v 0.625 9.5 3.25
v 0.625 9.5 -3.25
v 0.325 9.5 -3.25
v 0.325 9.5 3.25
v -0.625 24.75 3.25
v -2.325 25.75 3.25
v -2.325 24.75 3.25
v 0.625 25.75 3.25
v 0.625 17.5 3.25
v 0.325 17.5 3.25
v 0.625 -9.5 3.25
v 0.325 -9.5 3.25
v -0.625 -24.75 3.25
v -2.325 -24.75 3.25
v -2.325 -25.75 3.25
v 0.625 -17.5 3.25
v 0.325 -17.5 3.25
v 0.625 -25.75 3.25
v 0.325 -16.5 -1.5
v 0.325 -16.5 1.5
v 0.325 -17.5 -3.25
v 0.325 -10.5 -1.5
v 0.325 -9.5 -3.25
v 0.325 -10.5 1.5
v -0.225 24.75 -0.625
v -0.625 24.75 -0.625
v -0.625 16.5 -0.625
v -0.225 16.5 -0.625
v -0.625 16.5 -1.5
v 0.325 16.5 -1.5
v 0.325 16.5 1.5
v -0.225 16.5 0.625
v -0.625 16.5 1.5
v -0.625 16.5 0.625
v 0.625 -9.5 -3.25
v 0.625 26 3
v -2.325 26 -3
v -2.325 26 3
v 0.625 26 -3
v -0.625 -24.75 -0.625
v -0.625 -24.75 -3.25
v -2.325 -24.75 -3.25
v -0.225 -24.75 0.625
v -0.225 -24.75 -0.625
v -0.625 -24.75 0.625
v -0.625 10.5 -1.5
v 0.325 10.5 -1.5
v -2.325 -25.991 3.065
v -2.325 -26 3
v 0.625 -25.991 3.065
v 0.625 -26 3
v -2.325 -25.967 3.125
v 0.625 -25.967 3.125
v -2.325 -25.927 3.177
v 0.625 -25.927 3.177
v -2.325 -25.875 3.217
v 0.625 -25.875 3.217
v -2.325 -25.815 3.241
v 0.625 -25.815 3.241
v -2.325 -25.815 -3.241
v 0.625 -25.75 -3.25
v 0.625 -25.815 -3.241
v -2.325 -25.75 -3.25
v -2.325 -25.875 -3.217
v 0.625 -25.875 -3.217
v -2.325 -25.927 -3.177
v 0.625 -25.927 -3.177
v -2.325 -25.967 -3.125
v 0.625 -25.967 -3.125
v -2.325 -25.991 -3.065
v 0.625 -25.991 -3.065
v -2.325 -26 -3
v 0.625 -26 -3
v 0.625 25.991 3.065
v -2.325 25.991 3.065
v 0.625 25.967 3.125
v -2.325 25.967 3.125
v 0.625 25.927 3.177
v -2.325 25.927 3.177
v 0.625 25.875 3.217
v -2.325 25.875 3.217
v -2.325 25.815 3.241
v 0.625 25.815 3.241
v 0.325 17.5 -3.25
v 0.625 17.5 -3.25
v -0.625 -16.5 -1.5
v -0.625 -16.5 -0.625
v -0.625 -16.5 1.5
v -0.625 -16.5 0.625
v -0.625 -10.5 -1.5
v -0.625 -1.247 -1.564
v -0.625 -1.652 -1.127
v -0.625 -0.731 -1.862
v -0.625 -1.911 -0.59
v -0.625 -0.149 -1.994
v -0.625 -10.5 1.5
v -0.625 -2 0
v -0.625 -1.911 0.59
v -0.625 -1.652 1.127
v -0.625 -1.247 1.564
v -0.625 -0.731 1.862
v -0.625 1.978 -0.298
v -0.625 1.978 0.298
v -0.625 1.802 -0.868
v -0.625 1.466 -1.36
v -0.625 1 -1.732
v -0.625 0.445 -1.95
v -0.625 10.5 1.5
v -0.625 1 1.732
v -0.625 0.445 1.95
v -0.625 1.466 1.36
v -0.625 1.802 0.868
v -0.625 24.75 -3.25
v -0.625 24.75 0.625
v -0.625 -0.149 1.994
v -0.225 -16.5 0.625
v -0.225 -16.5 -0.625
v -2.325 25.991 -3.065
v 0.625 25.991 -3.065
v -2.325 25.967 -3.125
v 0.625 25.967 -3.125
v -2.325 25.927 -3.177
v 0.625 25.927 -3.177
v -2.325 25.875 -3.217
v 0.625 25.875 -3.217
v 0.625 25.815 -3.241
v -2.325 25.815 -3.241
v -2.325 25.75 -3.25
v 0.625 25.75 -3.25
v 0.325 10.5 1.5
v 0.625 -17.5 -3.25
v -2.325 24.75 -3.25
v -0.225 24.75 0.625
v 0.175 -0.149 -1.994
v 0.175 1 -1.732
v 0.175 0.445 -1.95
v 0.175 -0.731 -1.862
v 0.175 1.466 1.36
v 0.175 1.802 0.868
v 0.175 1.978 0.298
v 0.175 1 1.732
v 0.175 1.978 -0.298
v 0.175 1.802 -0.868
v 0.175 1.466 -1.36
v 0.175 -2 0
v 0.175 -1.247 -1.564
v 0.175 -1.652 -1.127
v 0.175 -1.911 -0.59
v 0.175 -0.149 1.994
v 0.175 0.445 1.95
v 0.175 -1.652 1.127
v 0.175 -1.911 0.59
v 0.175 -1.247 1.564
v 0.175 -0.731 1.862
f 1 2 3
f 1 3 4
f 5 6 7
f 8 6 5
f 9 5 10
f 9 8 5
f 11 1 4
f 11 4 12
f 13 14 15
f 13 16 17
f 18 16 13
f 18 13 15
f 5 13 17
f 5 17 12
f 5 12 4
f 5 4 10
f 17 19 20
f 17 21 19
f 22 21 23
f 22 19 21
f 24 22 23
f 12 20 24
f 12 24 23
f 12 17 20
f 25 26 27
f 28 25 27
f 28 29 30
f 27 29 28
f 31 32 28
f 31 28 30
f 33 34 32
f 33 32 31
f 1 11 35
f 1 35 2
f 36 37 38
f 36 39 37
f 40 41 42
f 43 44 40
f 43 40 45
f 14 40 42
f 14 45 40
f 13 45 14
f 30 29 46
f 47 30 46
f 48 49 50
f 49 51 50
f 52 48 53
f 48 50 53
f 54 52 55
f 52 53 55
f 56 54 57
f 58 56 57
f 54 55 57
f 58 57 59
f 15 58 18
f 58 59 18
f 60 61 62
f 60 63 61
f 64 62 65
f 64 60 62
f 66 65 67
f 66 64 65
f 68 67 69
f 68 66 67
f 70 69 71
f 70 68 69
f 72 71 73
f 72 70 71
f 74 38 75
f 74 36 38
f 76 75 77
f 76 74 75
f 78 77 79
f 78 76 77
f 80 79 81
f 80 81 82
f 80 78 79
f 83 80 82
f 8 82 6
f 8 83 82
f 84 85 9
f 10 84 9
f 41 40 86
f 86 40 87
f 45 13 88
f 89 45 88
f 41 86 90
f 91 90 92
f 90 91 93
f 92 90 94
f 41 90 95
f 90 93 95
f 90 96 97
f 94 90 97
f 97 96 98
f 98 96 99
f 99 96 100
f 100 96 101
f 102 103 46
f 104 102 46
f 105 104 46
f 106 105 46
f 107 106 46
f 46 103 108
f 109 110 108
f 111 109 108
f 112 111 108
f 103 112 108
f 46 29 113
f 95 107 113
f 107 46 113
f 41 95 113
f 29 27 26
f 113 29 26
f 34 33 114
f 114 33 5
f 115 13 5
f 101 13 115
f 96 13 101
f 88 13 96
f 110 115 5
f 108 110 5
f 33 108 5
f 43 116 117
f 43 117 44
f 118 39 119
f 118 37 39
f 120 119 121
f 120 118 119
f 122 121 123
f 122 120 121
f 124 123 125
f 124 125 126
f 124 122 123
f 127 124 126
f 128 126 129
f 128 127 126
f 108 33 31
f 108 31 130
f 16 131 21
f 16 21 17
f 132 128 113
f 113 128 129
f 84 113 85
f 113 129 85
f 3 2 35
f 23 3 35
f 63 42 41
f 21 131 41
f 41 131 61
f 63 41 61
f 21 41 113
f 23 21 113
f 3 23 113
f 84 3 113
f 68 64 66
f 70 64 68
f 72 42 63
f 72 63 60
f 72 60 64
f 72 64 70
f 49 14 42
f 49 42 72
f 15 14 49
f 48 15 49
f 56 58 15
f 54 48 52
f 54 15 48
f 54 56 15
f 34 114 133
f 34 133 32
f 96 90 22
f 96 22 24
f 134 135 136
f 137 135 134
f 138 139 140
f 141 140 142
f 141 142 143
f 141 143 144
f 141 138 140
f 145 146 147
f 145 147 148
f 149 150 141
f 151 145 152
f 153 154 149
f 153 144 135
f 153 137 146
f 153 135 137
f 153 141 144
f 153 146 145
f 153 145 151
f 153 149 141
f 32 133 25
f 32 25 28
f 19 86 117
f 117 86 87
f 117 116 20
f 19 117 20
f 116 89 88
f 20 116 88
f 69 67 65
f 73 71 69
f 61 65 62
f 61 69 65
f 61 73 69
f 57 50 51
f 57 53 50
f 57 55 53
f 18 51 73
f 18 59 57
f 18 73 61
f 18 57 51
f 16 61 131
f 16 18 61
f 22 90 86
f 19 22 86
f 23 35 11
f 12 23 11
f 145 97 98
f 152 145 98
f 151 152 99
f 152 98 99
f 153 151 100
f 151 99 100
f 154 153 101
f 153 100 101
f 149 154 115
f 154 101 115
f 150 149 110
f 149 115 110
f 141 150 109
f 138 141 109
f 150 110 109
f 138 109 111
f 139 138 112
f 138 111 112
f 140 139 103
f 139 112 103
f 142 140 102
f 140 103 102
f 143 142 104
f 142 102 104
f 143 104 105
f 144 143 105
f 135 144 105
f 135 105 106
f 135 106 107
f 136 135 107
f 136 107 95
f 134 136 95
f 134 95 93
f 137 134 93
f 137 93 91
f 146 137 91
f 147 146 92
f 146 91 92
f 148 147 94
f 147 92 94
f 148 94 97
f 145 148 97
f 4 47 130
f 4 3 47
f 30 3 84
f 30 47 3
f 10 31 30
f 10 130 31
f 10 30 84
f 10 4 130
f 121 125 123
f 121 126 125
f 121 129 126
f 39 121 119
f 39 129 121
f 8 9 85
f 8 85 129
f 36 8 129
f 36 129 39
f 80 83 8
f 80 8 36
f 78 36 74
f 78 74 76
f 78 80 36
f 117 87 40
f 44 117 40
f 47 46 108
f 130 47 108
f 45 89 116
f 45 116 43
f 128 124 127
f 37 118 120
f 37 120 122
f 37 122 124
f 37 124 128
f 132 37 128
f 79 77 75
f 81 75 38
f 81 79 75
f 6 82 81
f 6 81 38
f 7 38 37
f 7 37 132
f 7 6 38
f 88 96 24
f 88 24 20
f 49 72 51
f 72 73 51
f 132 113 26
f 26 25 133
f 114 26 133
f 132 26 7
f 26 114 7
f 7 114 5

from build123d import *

# Parameters (mm, degrees)
F0_W      = 52
F0_H      = 6.5
F1_DEPTH  = 0.625
F2_W      = 1.25
F2_H      = 6.5
F3_DEPTH  = 1.7
F4_R      = 0.25
F5_R      = 2
F6_DEPTH  = 0.8
F7_W      = 8
F7_H      = 6.5
F8_DEPTH  = 0.3
F9_W      = 6
F9_H      = 3
F10_DEPTH = 0.95
F11_W     = 8.25
F11_H     = 1.25
F12_DEPTH = 0.4


with BuildPart() as f1:
    # F0 (on Right) → F1 (new body, symmetric)
    with BuildSketch(Plane.YZ):
        Rectangle(F0_W, F0_H)
    extrude(amount=F1_DEPTH, both=True)

    # F2 (on face) → F3 (join)
    with BuildSketch(Plane(origin=(-0.625, 0, 0), x_dir=(0, -1, 0), z_dir=(-1, 0, 0))):
        with Locations((-25.375, 0)):
            Rectangle(F2_W, F2_H)
        with Locations((25.375, 0)):
            Rectangle(F2_W, F2_H)
    extrude(amount=F3_DEPTH)

    # F4
    f4_edges = [f1.edges().sort_by_distance(p)[0] for p in [
        (-0.85, -26, 3.25),
        (-0.85, -26, -3.25),
        (-0.85, 26, 3.25),
        (-0.85, 26, -3.25),
    ]]
    fillet(f4_edges, radius=F4_R)

    # F5 (on face) → F6 (cut)
    with BuildSketch(Plane(origin=(-0.625, 0, 0), x_dir=(0, -1, 0), z_dir=(-1, 0, 0))):
        Circle(F5_R)
    extrude(amount=-F6_DEPTH, mode=Mode.SUBTRACT)

    # F7 (on face) → F8 (cut)
    with BuildSketch(Plane.YZ.offset(0.625)):
        with Locations((-13.5, 0)):
            Rectangle(F7_W, F7_H)
        with Locations((13.5, 0)):
            Rectangle(F7_W, F7_H)
    extrude(amount=-F8_DEPTH, mode=Mode.SUBTRACT)

    # F9 (on face) → F10 (cut, through all)
    with BuildSketch(Plane(origin=(-0.625, 0, 0), x_dir=(0, -1, 0), z_dir=(-1, 0, 0))):
        with Locations((13.5, 0)):
            Rectangle(F9_W, F9_H)
        with Locations((-13.5, 0)):
            Rectangle(F9_W, F9_H)
    extrude(amount=-F10_DEPTH, mode=Mode.SUBTRACT)

    # F11 (on face) → F12 (cut)
    with BuildSketch(Plane(origin=(-0.625, 0, 0), x_dir=(0, -1, 0), z_dir=(-1, 0, 0))):
        with Locations((-20.625, 0)):
            Rectangle(F11_W, F11_H)
        with Locations((20.625, 0)):
            Rectangle(F11_W, F11_H)
    extrude(amount=-F12_DEPTH, mode=Mode.SUBTRACT)


solid = f1.part
